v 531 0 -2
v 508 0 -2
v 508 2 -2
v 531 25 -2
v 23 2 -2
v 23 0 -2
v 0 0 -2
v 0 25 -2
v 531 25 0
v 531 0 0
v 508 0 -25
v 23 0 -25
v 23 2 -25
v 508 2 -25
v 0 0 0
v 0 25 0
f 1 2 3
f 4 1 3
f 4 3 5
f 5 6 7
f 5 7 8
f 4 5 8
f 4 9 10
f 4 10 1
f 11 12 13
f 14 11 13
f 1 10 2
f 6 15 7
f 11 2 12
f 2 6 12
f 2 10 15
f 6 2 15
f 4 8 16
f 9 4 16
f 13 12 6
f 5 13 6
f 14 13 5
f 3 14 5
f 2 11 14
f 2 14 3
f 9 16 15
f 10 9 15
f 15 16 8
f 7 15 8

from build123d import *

# Parameters (mm, degrees)
EXTRUDE_1_DEPTH     = 531
SKETCH_2_W          = 23
SKETCH_2_H          = 23
CUT_EXTRUDE_1_DEPTH = 26


with BuildPart() as part:
    # Эскиз1 → Вытянуть-Тонкостенный1 (new body)
    with BuildSketch(Plane(origin=(0, 0, 0), x_dir=(0, 0, -1), z_dir=(1, 0, 0))):
        Polygon((0, 25), (0, 0), (25, 0), (25, 2), (2, 2), (2, 25), align=None)
    extrude(amount=EXTRUDE_1_DEPTH)

    # Эскиз2 → Вырез-Вытянуть1 (cut, through all)
    with BuildSketch(Plane.XZ):
        with Locations((11.5, -13.5)):
            Rectangle(SKETCH_2_W, SKETCH_2_H)
        with Locations((519.5, -13.5)):
            Rectangle(SKETCH_2_W, SKETCH_2_H)
    extrude(amount=-CUT_EXTRUDE_1_DEPTH, mode=Mode.SUBTRACT)


solid = part.part
